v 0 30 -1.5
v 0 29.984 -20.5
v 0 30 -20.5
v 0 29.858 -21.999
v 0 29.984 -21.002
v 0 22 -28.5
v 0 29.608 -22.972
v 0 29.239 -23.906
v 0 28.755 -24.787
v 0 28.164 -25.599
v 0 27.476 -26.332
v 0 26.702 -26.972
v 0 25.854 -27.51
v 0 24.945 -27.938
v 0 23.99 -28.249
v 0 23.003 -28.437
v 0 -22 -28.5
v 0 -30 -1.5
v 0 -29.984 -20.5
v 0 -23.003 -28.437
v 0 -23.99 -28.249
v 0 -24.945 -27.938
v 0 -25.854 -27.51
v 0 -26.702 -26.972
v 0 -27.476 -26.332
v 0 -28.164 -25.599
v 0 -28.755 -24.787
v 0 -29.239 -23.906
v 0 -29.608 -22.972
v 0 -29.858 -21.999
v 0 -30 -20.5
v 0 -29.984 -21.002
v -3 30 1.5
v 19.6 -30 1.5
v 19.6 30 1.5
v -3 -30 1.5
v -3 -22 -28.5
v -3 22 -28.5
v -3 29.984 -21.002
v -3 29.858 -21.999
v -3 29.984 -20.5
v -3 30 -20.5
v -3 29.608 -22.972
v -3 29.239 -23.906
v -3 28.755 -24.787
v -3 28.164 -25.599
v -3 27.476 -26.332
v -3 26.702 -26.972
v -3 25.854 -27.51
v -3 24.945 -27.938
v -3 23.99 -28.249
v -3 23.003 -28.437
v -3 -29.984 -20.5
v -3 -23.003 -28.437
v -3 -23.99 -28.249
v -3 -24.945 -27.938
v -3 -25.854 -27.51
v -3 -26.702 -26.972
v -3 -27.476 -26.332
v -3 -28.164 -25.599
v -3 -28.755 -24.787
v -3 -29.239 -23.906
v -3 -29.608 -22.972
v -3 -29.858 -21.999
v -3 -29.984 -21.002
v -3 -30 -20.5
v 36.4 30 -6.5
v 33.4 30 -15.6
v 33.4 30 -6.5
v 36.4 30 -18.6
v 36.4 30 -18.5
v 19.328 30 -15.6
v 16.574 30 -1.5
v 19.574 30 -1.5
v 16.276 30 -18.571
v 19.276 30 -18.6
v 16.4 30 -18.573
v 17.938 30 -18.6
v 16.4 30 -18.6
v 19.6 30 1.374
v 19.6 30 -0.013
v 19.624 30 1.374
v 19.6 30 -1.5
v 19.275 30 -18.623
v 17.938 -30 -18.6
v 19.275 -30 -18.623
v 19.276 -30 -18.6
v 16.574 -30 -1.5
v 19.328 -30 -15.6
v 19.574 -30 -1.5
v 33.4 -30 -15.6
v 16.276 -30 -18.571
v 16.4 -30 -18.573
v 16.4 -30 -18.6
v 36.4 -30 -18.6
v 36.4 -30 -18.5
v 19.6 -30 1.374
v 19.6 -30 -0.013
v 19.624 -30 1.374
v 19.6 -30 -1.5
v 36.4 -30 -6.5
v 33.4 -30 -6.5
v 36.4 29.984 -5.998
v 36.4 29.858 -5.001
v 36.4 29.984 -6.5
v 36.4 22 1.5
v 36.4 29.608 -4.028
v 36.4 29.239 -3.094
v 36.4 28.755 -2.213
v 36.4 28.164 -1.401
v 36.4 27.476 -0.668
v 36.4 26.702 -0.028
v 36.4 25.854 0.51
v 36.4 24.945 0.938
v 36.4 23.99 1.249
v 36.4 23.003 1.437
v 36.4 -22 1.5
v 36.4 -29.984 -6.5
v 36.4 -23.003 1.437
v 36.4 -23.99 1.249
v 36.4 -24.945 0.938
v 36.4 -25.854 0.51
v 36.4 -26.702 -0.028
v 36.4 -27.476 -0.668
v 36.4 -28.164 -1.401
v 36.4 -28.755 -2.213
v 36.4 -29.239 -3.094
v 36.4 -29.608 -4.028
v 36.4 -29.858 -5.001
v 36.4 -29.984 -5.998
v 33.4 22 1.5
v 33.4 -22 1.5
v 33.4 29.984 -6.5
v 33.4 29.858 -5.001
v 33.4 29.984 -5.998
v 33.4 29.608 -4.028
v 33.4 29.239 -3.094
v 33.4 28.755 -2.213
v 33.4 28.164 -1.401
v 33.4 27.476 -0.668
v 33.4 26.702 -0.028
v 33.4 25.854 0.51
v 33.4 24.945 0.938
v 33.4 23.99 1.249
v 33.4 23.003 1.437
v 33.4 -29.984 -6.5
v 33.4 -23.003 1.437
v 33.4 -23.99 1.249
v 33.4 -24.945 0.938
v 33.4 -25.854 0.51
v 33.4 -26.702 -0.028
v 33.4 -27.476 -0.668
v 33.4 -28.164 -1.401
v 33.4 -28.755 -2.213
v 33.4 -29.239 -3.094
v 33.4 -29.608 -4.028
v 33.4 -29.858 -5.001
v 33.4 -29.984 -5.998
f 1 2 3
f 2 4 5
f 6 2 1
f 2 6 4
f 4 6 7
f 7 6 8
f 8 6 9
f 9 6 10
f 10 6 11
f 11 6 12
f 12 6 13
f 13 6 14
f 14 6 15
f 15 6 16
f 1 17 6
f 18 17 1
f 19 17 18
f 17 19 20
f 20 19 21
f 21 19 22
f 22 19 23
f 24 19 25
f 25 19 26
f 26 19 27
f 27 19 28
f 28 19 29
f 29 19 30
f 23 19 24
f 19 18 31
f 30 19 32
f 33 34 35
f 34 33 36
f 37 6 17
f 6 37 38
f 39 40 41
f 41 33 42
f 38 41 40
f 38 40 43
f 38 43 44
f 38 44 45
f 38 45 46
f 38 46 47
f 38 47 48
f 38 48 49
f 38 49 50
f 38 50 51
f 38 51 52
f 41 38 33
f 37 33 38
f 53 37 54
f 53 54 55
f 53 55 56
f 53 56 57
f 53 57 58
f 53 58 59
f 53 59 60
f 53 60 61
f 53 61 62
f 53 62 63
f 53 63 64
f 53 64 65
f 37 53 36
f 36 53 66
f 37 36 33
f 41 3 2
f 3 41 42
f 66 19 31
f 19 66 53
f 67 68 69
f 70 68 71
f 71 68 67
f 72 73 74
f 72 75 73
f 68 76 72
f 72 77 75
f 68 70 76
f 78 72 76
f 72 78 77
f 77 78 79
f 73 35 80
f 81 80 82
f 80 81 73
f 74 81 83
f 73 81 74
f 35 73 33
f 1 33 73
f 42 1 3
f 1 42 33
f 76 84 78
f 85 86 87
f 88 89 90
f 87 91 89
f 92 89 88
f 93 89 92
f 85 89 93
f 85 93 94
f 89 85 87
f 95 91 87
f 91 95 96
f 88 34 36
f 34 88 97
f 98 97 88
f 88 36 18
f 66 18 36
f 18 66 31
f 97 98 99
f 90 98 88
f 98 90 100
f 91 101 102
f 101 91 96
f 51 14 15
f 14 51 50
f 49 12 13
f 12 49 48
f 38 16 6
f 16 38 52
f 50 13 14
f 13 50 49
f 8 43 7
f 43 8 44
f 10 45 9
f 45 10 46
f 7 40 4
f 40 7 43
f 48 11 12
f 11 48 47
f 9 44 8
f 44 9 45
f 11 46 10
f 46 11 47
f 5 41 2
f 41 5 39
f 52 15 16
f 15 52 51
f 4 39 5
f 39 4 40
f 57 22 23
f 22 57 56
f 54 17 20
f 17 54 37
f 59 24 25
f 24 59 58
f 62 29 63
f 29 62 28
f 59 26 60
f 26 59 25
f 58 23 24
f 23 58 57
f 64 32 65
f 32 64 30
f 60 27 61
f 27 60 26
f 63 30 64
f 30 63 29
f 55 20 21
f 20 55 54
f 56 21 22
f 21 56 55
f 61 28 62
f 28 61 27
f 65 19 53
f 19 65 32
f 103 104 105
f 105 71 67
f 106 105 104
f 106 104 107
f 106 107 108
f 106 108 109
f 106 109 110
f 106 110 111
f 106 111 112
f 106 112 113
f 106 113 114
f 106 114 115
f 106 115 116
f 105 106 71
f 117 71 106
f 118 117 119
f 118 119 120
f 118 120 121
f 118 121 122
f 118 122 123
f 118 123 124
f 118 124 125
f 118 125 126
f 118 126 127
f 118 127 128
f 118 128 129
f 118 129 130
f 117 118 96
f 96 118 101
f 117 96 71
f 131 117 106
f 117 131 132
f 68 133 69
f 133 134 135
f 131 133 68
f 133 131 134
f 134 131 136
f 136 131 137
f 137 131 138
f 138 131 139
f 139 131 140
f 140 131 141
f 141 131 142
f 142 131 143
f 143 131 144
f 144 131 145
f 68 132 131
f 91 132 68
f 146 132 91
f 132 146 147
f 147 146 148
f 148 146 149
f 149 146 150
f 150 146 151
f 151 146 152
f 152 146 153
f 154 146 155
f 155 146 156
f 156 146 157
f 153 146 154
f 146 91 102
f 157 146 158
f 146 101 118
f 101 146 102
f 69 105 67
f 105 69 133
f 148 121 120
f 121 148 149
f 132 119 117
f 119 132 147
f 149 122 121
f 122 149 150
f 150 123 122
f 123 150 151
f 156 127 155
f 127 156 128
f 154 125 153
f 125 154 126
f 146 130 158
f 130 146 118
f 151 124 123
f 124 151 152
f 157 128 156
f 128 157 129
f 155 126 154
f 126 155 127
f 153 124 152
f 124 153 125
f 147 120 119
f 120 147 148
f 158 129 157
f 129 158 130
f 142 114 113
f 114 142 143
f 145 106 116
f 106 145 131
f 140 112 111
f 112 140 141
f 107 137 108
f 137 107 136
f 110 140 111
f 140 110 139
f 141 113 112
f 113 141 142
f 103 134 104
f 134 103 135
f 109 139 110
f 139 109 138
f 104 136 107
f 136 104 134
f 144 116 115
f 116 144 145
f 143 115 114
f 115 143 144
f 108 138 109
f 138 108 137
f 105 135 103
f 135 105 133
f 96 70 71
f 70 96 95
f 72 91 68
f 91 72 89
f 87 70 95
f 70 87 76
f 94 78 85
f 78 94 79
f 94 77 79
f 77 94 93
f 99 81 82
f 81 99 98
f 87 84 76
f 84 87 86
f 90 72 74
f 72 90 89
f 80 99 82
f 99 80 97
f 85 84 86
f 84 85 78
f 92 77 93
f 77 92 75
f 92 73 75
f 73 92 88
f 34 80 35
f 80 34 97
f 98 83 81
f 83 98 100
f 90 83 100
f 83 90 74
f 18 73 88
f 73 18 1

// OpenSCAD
$fn = 50*1;

// Drawer door thickness 
drawer_thickness = 16.6; // [5:0.1:40]
// Handle width 
width = 60; // [20:120]

// How much the handle will protrude from the drawer door
handle_depth = 20; // [15:30]

handle_height = 20; // [16:30]

handle_facing = "up"; // [up,down]

// Height of outter wall (not the handle)
middle_height = 20; // [15:40]

// Height of the inner wall 
inner_height = 30; // [20:50]

// Thickness of bridges between inner and middle wall and between middle wall and the handle (for PLA recommended at least 3mm otherwise it will band)
thickness_bottom = 3; // [2:0.1:5]
// Vertial walls thickness
thickness_wall = 3; // [2:0.1:5]

handle_rotate = 180*1;

thicknessMiddleAdd = 1*1;

angleMiddle = 1*1;
angleHandle = -3*1;

rounded = 8*1;

module rl(m, rounded) {
        cube([m[0], m[1]-rounded*2, m[2]], center=true);
        translate([0, 0, rounded/2])
            cube([m[0], m[1], m[2]-rounded], center=true);
        translate([0, m[1]/2-rounded, -m[2]/2+rounded])
            rc(m[0], rounded);
        translate([0, -m[1]/2+rounded, -m[2]/2+rounded])
            rc(m[0], rounded);
    }

     
    module rc(thickness, rounded) {
        rotate([0,90,0])
            cylinder(thickness, r=rounded, center=true);
    }
	
	
//---------------------------------
// MAIN PROGRAM
//---------------------------------
rotate([0,0,0]) {
    // INNER
    translate([-thickness_wall/2, 
				0, 
				thickness_bottom/2 - inner_height/2])
        rl([thickness_wall, width, inner_height], rounded);
    
    // MIDDLE
    translate([drawer_thickness + thickness_wall/2, 0, 0]) 
        rotate([0, angleMiddle, 0])
            translate([0, 
						0, 
						thickness_bottom/2 - middle_height/2 - 0.1])
				cube([thickness_wall, width, middle_height], center=true);
                //rl([thickness_wall, width, middle_height], rounded);

    // Drawer bridge
    translate([(drawer_thickness)/2, 0, 0]) 
        cube([drawer_thickness + thickness_wall * 2, width, thickness_bottom], center=true);

	if (handle_facing == "up") {
		echo ("facing up");
		handle_rotate = 180; }
	else {
		echo ("facing down");
		handle_rotate = 0; }
	echo ("handle rotate: ", handle_rotate);
		
	if (handle_facing == "up")
	{
		// Handle bridge
		translate([handle_depth/2 + drawer_thickness - 0.2, // - thicknessMiddleAdd / 3.1, 
					0, 
					thickness_bottom - middle_height - 0.1]) 
			cube([handle_depth, width, thickness_bottom], center=true);
		
		// HANDLE
		translate([handle_depth + drawer_thickness - thickness_wall/2 + thickness_wall - 0.2, 
					0, 
					handle_height/2 - middle_height + thickness_bottom/2])  //thickness_bottom + 0]) 
			rotate([180, 0, 0])
				translate([-thickness_wall, 0, 0]) //handle_height/2])
					rl([thickness_wall, width, handle_height], rounded);
	}
	else // handle facing down
	{
		// Handle bridge
		translate([handle_depth/2 + drawer_thickness - 0.2, // - thicknessMiddleAdd / 3.1, 
					0, 0])
					//thickness_bottom - middle_height - 0.1]) 
			cube([handle_depth, width, thickness_bottom], center=true);
		
		// HANDLE
		translate([handle_depth + drawer_thickness - thickness_wall/2 + thickness_wall - 0.2, 
					0, 
					handle_height/2 - middle_height + thickness_bottom/2]) //thickness_bottom + 0]) 
			rotate([0, 0, 0])
				translate([-thickness_wall, 0, 0]) //handle_height/2])
					rl([thickness_wall, width, handle_height], rounded);
	}		
}
